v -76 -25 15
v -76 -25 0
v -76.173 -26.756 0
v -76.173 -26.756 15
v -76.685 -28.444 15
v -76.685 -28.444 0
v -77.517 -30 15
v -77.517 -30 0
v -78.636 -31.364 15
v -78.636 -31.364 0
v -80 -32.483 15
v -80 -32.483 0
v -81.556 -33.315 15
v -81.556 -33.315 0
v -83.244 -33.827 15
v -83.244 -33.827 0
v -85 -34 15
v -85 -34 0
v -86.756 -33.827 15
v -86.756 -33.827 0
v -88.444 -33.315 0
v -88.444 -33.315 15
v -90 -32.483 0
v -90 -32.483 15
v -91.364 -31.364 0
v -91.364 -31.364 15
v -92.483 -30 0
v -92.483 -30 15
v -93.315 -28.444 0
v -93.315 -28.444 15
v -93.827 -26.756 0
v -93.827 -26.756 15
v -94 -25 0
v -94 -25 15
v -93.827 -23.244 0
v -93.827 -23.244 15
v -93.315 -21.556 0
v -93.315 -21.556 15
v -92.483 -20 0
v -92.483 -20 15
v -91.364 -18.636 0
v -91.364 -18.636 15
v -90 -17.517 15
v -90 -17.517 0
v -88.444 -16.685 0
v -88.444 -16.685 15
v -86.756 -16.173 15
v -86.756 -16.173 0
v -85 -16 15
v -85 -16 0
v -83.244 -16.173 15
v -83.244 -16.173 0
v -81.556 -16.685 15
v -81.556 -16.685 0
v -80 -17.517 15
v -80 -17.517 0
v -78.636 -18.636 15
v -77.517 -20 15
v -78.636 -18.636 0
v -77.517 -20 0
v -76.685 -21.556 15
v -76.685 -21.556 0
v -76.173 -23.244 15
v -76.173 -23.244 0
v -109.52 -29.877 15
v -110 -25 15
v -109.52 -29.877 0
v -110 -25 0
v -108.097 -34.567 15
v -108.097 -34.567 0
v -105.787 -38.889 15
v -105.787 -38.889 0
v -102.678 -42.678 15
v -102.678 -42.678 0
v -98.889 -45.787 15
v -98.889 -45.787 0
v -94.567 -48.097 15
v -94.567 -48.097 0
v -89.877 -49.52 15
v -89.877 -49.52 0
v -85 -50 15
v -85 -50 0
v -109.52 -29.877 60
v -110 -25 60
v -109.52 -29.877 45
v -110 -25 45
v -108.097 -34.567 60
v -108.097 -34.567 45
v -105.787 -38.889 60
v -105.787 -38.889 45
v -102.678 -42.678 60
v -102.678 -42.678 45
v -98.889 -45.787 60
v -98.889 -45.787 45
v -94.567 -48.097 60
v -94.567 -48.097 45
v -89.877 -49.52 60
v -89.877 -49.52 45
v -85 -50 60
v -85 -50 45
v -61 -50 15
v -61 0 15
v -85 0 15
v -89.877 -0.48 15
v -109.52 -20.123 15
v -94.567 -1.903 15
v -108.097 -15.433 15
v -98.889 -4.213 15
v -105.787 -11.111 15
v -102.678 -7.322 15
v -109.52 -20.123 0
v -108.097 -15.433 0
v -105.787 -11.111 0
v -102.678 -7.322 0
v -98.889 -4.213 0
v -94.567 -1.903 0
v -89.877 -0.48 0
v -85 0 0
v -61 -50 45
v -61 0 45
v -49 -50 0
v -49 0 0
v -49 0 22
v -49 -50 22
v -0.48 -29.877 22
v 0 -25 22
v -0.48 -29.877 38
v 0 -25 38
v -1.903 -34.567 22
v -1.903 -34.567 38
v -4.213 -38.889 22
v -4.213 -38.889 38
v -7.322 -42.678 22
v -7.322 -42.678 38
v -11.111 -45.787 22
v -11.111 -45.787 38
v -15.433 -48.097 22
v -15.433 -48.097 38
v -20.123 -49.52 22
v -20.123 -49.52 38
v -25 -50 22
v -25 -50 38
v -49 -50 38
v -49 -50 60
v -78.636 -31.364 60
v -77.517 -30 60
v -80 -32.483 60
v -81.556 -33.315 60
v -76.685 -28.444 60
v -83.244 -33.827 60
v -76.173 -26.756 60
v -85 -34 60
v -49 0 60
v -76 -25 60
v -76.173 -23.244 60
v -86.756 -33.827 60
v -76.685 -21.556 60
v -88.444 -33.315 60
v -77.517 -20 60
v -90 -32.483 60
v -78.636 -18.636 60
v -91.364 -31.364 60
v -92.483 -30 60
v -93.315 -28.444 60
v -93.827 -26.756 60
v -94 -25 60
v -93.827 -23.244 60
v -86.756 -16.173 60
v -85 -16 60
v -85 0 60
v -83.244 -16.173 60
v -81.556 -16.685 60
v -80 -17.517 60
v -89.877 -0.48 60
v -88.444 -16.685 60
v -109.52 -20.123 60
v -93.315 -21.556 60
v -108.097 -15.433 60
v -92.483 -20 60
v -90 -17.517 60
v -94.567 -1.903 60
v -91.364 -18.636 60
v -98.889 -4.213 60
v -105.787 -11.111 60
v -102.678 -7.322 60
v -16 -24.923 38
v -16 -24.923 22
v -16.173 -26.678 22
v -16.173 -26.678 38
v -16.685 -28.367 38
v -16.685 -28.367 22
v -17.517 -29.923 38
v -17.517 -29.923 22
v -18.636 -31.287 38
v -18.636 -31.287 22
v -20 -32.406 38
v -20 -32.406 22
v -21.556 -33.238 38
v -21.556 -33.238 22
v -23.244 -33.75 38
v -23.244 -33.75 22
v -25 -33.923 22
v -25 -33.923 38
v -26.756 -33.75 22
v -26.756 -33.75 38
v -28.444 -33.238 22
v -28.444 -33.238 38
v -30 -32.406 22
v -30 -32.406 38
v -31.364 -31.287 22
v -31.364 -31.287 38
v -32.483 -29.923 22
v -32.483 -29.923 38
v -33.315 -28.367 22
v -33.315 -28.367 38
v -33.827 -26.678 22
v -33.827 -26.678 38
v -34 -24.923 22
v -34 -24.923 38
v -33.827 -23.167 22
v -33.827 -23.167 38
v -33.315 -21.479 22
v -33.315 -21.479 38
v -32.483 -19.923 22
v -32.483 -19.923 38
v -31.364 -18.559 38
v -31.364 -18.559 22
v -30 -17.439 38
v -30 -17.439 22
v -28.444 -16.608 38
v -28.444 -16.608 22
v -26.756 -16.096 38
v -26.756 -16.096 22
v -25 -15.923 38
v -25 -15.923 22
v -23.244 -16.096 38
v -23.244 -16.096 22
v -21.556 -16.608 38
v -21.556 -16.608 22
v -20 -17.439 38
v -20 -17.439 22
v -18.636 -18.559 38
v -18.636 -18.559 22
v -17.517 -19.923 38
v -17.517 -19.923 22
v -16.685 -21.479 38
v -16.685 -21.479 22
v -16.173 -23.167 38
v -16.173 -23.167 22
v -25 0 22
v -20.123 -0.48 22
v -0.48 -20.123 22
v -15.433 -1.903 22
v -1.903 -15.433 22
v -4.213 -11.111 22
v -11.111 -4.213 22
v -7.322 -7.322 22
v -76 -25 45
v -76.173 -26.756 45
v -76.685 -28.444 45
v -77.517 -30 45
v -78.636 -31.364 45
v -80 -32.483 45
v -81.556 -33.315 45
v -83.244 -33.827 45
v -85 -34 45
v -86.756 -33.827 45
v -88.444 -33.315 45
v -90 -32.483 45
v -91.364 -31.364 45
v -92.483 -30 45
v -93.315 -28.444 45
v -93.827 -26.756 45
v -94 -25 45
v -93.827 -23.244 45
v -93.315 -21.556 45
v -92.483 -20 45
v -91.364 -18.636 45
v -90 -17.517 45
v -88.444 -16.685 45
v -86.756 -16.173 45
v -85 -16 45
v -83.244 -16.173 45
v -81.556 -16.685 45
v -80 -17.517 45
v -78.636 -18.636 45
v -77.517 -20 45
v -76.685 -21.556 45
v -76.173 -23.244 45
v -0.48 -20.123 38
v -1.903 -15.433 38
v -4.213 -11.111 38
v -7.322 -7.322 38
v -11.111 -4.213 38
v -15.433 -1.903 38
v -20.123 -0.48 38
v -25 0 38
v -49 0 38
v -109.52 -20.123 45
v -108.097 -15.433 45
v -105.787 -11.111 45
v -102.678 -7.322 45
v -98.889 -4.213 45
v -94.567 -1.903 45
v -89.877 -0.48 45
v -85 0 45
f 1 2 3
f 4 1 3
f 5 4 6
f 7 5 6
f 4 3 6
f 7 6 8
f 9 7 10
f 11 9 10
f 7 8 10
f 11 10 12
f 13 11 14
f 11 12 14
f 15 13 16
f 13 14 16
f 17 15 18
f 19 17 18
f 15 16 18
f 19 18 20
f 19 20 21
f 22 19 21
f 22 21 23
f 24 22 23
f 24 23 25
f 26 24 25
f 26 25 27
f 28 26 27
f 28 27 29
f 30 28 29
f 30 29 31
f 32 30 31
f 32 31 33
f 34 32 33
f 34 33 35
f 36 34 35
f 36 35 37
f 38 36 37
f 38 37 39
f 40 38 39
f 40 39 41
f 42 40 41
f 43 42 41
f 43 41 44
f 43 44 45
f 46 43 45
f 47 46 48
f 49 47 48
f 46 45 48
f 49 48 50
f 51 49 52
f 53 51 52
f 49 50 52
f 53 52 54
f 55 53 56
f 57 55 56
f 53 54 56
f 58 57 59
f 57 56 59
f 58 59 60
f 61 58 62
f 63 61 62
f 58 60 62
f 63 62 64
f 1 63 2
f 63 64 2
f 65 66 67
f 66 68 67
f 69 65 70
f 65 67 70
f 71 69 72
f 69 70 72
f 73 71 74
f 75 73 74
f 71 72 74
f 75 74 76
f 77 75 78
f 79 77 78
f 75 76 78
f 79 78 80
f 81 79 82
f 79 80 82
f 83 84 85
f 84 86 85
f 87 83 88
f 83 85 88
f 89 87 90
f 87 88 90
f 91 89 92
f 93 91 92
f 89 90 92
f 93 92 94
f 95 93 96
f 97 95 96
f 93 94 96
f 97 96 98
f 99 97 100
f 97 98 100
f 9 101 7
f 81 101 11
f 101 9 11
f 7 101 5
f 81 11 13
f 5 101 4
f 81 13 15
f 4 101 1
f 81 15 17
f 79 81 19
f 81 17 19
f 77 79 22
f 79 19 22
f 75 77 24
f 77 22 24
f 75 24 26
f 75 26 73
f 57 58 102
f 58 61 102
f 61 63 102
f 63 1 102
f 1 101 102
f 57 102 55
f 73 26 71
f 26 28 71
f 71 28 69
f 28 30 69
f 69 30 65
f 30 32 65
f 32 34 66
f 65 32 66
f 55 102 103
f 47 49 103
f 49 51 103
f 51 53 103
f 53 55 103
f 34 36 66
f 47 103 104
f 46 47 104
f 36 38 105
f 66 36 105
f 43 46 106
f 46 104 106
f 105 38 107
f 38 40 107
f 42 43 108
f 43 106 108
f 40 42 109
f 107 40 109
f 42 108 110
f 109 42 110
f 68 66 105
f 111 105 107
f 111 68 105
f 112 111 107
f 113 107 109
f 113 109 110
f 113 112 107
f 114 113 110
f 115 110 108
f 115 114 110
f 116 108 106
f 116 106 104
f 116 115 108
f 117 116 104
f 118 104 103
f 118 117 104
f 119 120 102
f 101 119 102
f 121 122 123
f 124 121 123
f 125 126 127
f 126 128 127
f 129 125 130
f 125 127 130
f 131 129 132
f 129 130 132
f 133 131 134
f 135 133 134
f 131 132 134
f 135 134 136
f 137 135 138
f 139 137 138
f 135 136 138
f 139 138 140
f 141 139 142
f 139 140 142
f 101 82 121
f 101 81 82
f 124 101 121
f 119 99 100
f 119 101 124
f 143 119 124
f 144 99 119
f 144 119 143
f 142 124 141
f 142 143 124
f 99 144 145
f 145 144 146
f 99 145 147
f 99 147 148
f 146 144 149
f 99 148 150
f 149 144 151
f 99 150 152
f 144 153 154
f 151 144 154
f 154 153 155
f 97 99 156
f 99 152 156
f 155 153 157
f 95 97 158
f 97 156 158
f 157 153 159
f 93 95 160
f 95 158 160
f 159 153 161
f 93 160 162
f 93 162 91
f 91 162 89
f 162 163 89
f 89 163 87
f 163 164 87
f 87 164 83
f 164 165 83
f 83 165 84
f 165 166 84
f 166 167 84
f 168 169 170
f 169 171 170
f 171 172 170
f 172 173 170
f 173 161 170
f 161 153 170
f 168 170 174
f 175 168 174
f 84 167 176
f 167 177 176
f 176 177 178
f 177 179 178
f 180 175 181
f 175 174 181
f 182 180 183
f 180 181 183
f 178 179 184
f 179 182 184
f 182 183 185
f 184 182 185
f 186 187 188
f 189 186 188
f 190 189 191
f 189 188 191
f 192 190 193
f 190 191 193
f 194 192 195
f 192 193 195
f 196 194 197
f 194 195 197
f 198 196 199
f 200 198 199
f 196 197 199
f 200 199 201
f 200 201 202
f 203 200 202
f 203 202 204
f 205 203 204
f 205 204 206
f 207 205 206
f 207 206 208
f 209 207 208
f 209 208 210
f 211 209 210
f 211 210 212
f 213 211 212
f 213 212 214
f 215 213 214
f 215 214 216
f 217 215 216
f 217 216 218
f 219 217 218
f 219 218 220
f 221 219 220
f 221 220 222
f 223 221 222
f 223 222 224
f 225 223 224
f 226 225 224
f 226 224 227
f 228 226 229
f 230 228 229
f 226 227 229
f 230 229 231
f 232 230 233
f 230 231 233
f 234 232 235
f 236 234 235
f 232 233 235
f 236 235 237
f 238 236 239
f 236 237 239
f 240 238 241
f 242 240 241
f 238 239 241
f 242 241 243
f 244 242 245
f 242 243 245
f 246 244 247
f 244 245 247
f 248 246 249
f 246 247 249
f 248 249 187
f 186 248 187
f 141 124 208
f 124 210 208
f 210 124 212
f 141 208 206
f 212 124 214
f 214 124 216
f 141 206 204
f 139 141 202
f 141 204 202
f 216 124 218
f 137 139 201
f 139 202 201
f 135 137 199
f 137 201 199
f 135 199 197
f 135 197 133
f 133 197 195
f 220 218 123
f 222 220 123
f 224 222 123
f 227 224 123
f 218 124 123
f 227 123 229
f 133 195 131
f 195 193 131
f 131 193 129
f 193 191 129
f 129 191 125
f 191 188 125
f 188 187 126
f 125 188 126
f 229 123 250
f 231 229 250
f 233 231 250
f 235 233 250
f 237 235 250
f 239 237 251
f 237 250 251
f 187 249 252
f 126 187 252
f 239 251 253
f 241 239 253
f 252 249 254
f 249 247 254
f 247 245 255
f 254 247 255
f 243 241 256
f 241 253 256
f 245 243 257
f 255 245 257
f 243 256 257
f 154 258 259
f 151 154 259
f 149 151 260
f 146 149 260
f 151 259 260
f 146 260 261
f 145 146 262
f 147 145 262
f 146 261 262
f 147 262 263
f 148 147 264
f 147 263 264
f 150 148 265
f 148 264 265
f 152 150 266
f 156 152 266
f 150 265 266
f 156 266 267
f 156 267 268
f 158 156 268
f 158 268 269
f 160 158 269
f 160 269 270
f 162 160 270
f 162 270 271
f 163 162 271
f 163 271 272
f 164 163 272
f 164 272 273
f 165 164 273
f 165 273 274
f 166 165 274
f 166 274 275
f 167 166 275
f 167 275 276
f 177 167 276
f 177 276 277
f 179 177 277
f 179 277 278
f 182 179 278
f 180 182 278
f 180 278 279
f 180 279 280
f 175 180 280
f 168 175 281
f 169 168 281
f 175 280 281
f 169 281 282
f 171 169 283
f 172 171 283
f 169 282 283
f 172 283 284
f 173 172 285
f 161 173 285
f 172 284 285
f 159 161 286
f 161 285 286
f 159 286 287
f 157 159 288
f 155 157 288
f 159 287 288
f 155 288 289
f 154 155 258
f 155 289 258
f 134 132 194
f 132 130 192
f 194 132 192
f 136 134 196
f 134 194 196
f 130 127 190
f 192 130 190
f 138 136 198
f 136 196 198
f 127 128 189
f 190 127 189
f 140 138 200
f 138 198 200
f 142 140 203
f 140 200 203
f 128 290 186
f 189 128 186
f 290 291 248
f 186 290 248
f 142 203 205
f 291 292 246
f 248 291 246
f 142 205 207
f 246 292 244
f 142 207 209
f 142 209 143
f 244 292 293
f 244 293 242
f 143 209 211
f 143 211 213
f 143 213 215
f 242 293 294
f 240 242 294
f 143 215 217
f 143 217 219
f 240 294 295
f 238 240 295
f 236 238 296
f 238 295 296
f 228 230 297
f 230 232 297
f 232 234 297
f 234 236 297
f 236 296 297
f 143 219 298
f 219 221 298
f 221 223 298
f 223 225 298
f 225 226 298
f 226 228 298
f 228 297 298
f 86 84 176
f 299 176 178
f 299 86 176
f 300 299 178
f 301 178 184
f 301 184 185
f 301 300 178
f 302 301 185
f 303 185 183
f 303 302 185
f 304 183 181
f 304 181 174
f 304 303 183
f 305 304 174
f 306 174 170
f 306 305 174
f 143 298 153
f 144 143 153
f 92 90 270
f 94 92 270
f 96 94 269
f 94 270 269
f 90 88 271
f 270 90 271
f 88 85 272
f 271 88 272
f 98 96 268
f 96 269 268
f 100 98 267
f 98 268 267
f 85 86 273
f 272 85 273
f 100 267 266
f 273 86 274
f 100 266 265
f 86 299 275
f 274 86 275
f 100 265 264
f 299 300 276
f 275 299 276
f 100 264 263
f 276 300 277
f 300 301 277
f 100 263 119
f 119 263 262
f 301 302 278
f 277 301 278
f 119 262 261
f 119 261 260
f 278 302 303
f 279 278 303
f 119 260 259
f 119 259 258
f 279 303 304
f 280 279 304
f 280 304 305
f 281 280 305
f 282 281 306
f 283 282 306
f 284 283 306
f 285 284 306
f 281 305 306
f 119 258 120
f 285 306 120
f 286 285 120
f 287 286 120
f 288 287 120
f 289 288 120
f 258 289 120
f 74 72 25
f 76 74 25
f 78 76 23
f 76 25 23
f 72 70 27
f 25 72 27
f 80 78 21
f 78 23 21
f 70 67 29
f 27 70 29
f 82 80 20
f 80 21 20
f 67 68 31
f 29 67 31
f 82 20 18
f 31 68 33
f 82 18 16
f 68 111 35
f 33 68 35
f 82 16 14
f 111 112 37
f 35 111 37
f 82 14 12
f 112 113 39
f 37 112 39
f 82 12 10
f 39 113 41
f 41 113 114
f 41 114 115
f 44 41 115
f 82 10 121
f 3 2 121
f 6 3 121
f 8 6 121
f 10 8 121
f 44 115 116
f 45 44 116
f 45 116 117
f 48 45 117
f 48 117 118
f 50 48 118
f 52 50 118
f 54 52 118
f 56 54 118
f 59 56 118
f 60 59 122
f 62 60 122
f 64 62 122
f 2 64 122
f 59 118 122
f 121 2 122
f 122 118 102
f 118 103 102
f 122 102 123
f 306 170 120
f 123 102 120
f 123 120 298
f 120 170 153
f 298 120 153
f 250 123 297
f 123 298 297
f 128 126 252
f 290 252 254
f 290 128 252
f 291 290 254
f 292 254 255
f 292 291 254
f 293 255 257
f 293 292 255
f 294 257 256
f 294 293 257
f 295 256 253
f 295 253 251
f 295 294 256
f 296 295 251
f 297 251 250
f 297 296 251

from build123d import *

# Parameters (mm, degrees)
F1_DEPTH = 50
F2_R     = 24.99999
F3_R     = 9
F5_DEPTH = 60.001
F6_R     = 9
F7_DEPTH = 25.4


# Not quite as in the source:
# - a fillet or chamfer is up to 0.001 mm smaller than in the source, because OpenCascade refuses the exact size


with BuildPart() as f1:
    # F0 (on Front) → F1 (new body)
    with BuildSketch(Plane.XZ):
        Polygon((-110, 0), (-49, 0), (-49, 22), (0, 22), (0, 38), (-49, 38), (-49, 60), (-110, 60), (-110, 45), (-61, 45), (-61, 15), (-110, 15), align=None)
    extrude(amount=F1_DEPTH)

    # F2 (radius 25 in the source; OpenCascade refuses exactly that, so slightly less here)
    f2_edges = [f1.edges().sort_by_distance(p)[0] for p in [
        (-110, -50, 52.5),
        (-110, -50, 7.5),
        (-110, 0, 52.5),
        (-110, 0, 7.5),
        (0, -50, 30),
        (0, 0, 30),
    ]]
    fillet(f2_edges, radius=F2_R)

    # F3 (on face) → F5 (cut, through all)
    with BuildSketch(Plane(origin=(0, 0, 0), x_dir=(1, 0, 0), z_dir=(0, 0, -1))):
        with Locations((-85, 25)):
            Circle(F3_R)
    extrude(amount=-F5_DEPTH, mode=Mode.SUBTRACT)

    # F6 (on face) → F7 (cut)
    with BuildSketch(Plane(origin=(0, 0, 22), x_dir=(1, 0, 0), z_dir=(0, 0, -1))):
        with Locations((-25, 24.9226680556)):
            Circle(F6_R)
    extrude(amount=-F7_DEPTH, mode=Mode.SUBTRACT)


solid = f1.part
